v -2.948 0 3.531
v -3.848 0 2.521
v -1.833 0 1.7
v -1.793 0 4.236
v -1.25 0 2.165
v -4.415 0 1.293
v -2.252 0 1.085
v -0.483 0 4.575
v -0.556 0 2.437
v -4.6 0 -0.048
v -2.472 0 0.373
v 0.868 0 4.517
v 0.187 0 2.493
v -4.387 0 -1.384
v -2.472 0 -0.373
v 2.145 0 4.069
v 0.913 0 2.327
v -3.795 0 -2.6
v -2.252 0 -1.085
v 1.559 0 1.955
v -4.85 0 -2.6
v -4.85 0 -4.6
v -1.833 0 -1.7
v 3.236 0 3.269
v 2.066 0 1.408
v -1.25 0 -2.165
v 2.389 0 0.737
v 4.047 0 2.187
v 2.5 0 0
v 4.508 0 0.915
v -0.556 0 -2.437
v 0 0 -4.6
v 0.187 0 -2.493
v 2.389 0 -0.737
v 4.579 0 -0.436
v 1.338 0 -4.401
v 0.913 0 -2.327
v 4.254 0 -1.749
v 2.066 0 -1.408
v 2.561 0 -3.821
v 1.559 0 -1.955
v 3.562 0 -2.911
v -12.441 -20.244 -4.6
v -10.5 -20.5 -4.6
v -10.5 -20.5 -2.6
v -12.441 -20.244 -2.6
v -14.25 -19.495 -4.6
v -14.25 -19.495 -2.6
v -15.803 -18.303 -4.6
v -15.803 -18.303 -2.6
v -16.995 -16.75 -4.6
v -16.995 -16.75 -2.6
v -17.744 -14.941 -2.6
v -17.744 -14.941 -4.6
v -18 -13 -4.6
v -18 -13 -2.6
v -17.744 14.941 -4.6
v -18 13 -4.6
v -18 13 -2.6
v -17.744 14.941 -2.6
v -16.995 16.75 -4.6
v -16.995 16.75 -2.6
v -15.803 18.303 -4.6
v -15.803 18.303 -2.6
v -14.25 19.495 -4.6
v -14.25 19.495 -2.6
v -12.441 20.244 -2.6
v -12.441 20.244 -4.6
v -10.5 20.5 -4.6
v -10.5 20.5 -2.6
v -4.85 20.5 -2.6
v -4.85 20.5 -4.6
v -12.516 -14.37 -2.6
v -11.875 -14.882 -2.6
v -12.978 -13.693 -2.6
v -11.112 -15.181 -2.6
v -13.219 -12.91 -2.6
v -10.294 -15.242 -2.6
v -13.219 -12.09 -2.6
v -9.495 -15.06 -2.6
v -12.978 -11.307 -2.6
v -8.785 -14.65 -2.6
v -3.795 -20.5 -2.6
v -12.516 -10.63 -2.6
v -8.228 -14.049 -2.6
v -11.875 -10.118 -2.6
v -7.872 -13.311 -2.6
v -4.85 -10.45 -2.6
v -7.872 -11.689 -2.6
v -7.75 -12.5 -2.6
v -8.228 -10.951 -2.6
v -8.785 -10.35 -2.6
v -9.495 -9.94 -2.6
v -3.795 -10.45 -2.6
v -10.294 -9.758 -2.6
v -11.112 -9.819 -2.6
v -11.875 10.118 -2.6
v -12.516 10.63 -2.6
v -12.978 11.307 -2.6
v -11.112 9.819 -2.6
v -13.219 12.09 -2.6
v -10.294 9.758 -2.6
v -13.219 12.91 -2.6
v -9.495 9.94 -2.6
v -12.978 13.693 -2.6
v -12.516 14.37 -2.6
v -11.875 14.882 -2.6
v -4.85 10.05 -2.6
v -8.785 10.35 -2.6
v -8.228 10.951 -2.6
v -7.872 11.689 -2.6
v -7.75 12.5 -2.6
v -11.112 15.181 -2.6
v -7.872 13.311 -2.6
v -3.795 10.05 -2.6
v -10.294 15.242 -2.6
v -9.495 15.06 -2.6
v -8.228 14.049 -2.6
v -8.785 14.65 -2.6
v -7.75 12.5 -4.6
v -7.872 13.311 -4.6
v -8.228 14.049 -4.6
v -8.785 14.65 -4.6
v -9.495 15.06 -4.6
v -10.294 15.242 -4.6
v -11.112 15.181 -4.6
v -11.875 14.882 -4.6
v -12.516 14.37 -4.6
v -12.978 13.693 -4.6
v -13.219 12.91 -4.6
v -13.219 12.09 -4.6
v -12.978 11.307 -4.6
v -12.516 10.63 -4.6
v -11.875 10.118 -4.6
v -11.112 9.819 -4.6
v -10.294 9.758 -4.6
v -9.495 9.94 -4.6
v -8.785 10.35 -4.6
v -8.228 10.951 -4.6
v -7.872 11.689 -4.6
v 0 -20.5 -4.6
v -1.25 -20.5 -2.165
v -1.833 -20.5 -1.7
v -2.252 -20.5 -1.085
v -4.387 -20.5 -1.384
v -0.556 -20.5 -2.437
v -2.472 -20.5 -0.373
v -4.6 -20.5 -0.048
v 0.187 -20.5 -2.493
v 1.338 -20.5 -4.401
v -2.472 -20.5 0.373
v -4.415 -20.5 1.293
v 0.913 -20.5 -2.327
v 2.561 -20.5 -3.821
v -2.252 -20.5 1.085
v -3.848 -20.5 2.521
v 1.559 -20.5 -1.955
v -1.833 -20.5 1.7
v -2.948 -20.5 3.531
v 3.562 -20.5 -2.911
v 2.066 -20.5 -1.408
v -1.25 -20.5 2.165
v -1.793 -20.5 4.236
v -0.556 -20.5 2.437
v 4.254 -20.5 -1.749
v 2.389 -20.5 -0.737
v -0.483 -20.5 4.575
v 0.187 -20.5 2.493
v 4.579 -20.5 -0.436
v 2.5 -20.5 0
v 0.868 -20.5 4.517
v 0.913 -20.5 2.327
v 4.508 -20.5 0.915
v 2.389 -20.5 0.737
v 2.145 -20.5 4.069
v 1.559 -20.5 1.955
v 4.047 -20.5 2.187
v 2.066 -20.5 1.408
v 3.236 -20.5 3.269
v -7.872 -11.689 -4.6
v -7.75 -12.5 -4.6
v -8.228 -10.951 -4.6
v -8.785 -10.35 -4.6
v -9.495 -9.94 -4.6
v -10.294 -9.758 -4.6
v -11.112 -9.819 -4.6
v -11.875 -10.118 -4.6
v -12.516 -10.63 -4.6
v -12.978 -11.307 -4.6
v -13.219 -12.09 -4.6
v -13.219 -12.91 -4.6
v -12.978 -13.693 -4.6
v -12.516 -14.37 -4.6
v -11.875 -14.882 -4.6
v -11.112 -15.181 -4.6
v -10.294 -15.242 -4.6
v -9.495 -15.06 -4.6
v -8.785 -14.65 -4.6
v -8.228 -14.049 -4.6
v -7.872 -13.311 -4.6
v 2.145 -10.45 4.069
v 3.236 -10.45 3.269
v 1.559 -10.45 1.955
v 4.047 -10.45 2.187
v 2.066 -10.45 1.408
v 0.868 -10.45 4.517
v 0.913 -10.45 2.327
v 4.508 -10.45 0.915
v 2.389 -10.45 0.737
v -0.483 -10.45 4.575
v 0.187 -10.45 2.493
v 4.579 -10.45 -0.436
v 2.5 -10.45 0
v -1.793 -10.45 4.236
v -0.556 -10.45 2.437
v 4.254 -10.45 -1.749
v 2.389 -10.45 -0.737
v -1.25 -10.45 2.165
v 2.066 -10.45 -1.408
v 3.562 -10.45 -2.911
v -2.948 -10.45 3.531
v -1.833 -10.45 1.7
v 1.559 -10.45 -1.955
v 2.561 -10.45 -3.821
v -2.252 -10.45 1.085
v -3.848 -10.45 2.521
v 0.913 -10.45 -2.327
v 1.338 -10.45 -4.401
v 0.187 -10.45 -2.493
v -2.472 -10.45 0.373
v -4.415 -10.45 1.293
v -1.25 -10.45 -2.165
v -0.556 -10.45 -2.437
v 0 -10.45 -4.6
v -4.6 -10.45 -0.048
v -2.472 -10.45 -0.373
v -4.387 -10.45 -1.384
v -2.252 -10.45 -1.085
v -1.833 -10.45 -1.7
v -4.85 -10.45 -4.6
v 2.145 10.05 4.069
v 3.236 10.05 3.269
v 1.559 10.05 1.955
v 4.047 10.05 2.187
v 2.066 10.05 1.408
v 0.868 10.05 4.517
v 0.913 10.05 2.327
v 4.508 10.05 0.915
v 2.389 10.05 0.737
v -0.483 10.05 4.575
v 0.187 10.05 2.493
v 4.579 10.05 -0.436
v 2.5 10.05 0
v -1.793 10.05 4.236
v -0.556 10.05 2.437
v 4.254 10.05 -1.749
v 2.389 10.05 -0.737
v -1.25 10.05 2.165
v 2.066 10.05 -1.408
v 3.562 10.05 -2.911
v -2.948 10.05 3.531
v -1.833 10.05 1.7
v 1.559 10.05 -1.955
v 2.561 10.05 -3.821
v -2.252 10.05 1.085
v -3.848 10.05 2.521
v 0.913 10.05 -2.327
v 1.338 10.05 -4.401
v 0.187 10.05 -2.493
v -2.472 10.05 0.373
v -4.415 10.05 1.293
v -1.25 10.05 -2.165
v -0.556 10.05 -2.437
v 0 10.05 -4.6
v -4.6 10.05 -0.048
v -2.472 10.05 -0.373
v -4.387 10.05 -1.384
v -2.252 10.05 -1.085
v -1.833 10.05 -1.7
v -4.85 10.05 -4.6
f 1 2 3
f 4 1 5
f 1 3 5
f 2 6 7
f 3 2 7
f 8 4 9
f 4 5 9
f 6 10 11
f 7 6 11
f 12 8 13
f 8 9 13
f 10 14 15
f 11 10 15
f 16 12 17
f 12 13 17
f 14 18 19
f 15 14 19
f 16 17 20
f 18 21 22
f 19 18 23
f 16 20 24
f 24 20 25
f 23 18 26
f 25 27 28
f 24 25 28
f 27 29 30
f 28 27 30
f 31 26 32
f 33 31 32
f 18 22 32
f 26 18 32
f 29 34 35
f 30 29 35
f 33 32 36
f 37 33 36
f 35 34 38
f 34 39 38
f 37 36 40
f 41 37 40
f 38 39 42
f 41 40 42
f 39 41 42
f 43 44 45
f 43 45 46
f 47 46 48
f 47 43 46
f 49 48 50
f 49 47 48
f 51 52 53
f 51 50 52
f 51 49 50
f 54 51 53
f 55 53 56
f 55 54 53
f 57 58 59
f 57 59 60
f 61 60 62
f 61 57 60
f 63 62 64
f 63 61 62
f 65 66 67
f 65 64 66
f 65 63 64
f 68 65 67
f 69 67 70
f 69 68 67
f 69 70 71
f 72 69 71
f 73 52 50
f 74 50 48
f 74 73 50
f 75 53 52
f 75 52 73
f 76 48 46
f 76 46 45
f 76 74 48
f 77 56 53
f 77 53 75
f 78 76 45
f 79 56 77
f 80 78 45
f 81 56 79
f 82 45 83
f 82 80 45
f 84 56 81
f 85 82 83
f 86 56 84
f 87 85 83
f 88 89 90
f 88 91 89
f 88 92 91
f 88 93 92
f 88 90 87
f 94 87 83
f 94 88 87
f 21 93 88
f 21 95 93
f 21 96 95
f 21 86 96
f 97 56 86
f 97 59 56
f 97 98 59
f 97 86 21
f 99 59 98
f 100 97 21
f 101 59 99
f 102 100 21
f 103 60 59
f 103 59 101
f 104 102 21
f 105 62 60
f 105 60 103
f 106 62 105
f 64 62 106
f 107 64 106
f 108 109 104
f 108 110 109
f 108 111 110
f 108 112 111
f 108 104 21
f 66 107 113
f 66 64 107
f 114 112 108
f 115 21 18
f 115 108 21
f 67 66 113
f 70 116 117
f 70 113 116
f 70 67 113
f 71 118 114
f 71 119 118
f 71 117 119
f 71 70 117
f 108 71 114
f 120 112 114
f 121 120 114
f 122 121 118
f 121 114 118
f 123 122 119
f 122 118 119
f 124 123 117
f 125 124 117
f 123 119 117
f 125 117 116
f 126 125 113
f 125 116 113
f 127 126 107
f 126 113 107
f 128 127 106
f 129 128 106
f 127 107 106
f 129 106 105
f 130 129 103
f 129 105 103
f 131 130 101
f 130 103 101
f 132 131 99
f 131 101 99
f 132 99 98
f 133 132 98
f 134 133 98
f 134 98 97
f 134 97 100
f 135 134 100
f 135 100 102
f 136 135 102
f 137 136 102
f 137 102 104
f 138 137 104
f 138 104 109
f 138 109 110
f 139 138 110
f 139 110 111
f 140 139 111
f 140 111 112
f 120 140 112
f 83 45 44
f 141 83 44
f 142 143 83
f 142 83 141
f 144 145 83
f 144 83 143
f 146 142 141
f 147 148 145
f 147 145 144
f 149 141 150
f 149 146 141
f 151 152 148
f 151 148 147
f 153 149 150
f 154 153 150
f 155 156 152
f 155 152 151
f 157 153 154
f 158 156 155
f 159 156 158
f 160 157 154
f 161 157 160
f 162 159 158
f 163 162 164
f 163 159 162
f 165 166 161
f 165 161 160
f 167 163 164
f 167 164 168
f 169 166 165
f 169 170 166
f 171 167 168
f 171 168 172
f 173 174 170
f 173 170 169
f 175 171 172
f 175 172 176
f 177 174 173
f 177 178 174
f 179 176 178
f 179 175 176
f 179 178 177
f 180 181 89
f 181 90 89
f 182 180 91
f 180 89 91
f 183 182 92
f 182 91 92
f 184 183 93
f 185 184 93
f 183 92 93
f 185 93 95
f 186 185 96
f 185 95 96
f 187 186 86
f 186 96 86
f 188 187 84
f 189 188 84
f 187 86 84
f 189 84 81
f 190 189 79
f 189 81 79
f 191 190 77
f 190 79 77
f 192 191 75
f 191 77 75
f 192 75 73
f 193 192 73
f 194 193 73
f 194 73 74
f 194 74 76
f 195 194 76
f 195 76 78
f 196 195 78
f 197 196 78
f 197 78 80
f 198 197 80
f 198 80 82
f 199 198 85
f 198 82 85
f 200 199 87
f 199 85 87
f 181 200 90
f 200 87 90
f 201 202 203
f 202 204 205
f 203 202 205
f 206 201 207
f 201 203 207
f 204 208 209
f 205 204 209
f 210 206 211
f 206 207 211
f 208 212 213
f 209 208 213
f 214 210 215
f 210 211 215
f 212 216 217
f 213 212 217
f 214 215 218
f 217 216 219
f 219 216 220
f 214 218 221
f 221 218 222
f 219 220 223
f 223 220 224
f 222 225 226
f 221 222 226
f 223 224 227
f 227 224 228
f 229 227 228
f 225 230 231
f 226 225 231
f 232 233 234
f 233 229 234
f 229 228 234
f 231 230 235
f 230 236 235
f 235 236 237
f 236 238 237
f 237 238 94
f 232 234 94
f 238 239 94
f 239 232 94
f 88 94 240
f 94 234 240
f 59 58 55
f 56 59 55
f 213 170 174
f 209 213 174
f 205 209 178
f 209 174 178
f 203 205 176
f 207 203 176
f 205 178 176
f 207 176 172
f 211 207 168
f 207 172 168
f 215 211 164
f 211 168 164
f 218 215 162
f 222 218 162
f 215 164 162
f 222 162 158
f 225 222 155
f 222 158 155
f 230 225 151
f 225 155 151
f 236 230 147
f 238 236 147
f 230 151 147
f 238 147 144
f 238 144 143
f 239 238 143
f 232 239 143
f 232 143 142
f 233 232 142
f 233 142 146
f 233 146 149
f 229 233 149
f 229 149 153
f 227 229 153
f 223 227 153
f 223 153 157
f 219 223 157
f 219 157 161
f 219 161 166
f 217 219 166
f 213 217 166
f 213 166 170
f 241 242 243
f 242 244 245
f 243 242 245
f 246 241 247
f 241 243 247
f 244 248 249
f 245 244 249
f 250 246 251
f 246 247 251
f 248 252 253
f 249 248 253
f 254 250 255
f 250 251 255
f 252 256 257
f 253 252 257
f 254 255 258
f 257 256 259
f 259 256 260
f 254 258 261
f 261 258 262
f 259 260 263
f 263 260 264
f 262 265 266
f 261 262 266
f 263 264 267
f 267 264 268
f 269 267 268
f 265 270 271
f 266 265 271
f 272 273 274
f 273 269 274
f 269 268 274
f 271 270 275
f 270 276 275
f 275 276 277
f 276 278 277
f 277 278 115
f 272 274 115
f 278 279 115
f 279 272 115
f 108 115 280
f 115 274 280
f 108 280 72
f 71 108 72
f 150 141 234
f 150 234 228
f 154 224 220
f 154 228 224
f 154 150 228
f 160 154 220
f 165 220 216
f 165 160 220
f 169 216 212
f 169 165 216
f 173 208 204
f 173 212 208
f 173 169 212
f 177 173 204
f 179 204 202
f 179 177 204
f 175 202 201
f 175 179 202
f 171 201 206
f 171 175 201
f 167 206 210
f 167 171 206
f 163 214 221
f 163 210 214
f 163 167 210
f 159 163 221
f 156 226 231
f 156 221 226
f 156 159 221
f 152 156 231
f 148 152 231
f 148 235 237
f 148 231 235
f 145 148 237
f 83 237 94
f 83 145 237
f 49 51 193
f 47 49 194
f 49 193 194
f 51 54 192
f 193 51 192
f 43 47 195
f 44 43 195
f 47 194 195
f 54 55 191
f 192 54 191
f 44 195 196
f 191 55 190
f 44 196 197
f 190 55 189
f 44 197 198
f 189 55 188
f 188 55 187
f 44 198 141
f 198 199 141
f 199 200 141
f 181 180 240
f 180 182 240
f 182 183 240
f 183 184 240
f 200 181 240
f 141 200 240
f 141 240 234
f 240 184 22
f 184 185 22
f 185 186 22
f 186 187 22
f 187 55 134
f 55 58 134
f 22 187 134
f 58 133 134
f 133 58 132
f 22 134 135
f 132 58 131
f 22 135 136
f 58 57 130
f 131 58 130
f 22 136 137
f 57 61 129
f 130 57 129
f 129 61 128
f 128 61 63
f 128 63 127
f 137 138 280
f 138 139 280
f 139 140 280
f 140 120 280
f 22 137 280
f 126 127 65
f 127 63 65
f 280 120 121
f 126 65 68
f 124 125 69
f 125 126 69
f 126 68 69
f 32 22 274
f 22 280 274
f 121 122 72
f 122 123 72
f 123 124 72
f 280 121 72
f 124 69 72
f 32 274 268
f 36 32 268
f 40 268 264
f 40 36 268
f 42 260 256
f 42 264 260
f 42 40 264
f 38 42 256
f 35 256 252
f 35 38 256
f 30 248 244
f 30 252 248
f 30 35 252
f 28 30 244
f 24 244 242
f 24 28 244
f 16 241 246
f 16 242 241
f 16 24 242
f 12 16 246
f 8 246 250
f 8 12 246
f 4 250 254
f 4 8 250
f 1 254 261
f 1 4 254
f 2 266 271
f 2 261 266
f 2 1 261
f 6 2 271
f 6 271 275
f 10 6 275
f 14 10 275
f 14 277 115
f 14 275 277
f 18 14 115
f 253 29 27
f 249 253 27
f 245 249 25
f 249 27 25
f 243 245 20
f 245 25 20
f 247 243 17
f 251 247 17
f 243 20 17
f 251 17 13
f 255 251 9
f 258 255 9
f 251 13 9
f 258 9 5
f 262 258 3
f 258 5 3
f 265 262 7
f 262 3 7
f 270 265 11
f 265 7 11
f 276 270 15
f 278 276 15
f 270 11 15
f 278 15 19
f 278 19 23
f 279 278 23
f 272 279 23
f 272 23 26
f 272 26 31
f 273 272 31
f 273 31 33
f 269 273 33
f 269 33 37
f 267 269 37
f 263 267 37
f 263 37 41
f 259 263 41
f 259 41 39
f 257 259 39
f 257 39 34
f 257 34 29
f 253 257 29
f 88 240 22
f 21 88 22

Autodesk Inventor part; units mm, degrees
sketch "Sketch_1" plane through (0, 0, 0) normal (0, 0, 1) x (1, 0, 0)
  line L0 (0, -20.5) -> (0, 20.5)
  line L1 (0, 20.5) -> (4.6, 20.5)
  line L2 (4.6, 20.5) -> (4.6, -20.5)
  line L3 (4.6, -20.5) -> (0, -20.5)
  line L4 (0, -20.5) -> (0, 20.5)
revolve "Revolution1" add sketch "Sketch_1" angle 360 about axis through (0, -20.5, 0) along (0, -1, 0)
sketch "Sketch_2" plane through (0, 0, -4.6) normal (0, 0, 1) x (1, 0, 0)
  line L0 (-18, 13) -> (-18, -13)
  arc A0 (-18, -13) -> (-10.5, -20.5) centre (-10.5, -13) ccw
  line L1 (-10.5, -20.5) -> (0, -20.5)
  line L2 (0, -20.5) -> (0, 20.5)
  line L3 (0, 20.5) -> (-10.5, 20.5)
  arc A1 (-10.5, 20.5) -> (-18, 13) centre (-10.5, 13) ccw
extrude "Extrusion1" add sketch "Sketch_2" along normal blind 2
sketch "Sketch_3" plane through (0, 0, 0) normal (0, 0, 1) x (1, 0, 0)
  line L0 (-41, 41) -> (-41, -41)
  line L1 (-41, -41) -> (41, -41)
  line L2 (41, -41) -> (41, 41)
  line L3 (41, 41) -> (-41, 41)
  line L4 (-18, 20.5) -> (-18, -20.5)
  line L5 (-18, -20.5) -> (4.6, -20.5)
  line L6 (4.6, -20.5) -> (4.6, -10.45)
  line L7 (4.6, -10.45) -> (-4.85, -10.45)
  line L8 (-4.85, -10.45) -> (-4.85, 0)
  line L9 (-4.85, 0) -> (4.6, 0)
  line L10 (4.6, 0) -> (4.6, 10.05)
  line L11 (4.6, 10.05) -> (-4.85, 10.05)
  line L12 (-4.85, 10.05) -> (-4.85, 20.5)
  line L13 (-4.85, 20.5) -> (-18, 20.5)
extrude "Extrusion2" cut sketch "Sketch_3" along normal mid plane 82
sketch "Sketch_4" plane through (0, 0, 0) normal (0, 0, 1) x (1, 0, 0)
  line L0 (0, -20.5) -> (0, 20.5)
  line L1 (0, 20.5) -> (2.5, 20.5)
  line L2 (2.5, 20.5) -> (2.5, -20.5)
  line L3 (2.5, -20.5) -> (0, -20.5)
  line L4 (0, -20.5) -> (0, 20.5)
revolve "Revolution2" cut sketch "Sketch_4" angle 360 about axis through (0, -20.5, 0) along (0, -1, 0)
sketch "Sketch_11" plane through (0, 12.5, 0) normal (0, 1, 0) x (1, 0, 0)
  line L0 (-10.5, 2.6) -> (-10.5, 4.6)
  line L1 (-10.5, 4.6) -> (-7.75, 4.6)
  line L2 (-7.75, 4.6) -> (-7.75, 2.6)
  line L3 (-7.75, 2.6) -> (-10.5, 2.6)
  line L4 (-10.5, 2.6) -> (-10.5, 4.6)
revolve "Revolution3" cut sketch "Sketch_11" angle 360 about axis through (-10.5, 12.5, -2.6) along (0, 0, 1)
sketch "Sketch_5" plane through (0, -12.5, 0) normal (0, 1, 0) x (1, 0, 0)
  line L0 (-10.5, 2.6) -> (-10.5, 4.6)
  line L1 (-10.5, 4.6) -> (-7.75, 4.6)
  line L2 (-7.75, 4.6) -> (-7.75, 2.6)
  line L3 (-7.75, 2.6) -> (-10.5, 2.6)
  line L4 (-10.5, 2.6) -> (-10.5, 4.6)
revolve "Revolution4" cut sketch "Sketch_5" angle 360 about axis through (-10.5, -12.5, -2.6) along (0, 0, 1)
ref_plane "l_pin_XY" through (0, 0, 0) normal (0, 1, 0) x (1, 0, 0)
ref_plane "l_pin_YZ" through (0, 0, 0) normal (1, 0, 0) x (0, 0, -1)
ref_plane "l_pin_ZX" through (0, 0, 0) normal (0, 0, -1) x (0, 1, 0)
ref_plane "hole1l_to_bolt_XY" through (-10.5, 12.5, -2.6) normal (0, 0, 1) x (1, 0, 0)
ref_plane "hole1l_to_bolt_YZ" through (-10.5, 12.5, -2.6) normal (1, 0, 0) x (0, 1, 0)
ref_plane "hole1l_to_bolt_ZX" through (-10.5, 12.5, -2.6) normal (0, 1, 0) x (0, 0, 1)
ref_plane "hole2l_to_bolt_XY" through (-10.5, -12.5, -2.6) normal (0, 0, 1) x (1, 0, 0)
ref_plane "hole2l_to_bolt_YZ" through (-10.5, -12.5, -2.6) normal (1, 0, 0) x (0, 1, 0)
ref_plane "hole2l_to_bolt_ZX" through (-10.5, -12.5, -2.6) normal (0, 1, 0) x (0, 0, 1)
ref_plane "hole3l_to_bolt_XY" through (-10.5, 0, -2.6) normal (0, 0, 1) x (1, 0, 0)
ref_plane "hole3l_to_bolt_YZ" through (-10.5, 0, -2.6) normal (1, 0, 0) x (0, 1, 0)
ref_plane "hole3l_to_bolt_ZX" through (-10.5, 0, -2.6) normal (0, 1, 0) x (0, 0, 1)
properties part number "SHHPS5-2-l"
